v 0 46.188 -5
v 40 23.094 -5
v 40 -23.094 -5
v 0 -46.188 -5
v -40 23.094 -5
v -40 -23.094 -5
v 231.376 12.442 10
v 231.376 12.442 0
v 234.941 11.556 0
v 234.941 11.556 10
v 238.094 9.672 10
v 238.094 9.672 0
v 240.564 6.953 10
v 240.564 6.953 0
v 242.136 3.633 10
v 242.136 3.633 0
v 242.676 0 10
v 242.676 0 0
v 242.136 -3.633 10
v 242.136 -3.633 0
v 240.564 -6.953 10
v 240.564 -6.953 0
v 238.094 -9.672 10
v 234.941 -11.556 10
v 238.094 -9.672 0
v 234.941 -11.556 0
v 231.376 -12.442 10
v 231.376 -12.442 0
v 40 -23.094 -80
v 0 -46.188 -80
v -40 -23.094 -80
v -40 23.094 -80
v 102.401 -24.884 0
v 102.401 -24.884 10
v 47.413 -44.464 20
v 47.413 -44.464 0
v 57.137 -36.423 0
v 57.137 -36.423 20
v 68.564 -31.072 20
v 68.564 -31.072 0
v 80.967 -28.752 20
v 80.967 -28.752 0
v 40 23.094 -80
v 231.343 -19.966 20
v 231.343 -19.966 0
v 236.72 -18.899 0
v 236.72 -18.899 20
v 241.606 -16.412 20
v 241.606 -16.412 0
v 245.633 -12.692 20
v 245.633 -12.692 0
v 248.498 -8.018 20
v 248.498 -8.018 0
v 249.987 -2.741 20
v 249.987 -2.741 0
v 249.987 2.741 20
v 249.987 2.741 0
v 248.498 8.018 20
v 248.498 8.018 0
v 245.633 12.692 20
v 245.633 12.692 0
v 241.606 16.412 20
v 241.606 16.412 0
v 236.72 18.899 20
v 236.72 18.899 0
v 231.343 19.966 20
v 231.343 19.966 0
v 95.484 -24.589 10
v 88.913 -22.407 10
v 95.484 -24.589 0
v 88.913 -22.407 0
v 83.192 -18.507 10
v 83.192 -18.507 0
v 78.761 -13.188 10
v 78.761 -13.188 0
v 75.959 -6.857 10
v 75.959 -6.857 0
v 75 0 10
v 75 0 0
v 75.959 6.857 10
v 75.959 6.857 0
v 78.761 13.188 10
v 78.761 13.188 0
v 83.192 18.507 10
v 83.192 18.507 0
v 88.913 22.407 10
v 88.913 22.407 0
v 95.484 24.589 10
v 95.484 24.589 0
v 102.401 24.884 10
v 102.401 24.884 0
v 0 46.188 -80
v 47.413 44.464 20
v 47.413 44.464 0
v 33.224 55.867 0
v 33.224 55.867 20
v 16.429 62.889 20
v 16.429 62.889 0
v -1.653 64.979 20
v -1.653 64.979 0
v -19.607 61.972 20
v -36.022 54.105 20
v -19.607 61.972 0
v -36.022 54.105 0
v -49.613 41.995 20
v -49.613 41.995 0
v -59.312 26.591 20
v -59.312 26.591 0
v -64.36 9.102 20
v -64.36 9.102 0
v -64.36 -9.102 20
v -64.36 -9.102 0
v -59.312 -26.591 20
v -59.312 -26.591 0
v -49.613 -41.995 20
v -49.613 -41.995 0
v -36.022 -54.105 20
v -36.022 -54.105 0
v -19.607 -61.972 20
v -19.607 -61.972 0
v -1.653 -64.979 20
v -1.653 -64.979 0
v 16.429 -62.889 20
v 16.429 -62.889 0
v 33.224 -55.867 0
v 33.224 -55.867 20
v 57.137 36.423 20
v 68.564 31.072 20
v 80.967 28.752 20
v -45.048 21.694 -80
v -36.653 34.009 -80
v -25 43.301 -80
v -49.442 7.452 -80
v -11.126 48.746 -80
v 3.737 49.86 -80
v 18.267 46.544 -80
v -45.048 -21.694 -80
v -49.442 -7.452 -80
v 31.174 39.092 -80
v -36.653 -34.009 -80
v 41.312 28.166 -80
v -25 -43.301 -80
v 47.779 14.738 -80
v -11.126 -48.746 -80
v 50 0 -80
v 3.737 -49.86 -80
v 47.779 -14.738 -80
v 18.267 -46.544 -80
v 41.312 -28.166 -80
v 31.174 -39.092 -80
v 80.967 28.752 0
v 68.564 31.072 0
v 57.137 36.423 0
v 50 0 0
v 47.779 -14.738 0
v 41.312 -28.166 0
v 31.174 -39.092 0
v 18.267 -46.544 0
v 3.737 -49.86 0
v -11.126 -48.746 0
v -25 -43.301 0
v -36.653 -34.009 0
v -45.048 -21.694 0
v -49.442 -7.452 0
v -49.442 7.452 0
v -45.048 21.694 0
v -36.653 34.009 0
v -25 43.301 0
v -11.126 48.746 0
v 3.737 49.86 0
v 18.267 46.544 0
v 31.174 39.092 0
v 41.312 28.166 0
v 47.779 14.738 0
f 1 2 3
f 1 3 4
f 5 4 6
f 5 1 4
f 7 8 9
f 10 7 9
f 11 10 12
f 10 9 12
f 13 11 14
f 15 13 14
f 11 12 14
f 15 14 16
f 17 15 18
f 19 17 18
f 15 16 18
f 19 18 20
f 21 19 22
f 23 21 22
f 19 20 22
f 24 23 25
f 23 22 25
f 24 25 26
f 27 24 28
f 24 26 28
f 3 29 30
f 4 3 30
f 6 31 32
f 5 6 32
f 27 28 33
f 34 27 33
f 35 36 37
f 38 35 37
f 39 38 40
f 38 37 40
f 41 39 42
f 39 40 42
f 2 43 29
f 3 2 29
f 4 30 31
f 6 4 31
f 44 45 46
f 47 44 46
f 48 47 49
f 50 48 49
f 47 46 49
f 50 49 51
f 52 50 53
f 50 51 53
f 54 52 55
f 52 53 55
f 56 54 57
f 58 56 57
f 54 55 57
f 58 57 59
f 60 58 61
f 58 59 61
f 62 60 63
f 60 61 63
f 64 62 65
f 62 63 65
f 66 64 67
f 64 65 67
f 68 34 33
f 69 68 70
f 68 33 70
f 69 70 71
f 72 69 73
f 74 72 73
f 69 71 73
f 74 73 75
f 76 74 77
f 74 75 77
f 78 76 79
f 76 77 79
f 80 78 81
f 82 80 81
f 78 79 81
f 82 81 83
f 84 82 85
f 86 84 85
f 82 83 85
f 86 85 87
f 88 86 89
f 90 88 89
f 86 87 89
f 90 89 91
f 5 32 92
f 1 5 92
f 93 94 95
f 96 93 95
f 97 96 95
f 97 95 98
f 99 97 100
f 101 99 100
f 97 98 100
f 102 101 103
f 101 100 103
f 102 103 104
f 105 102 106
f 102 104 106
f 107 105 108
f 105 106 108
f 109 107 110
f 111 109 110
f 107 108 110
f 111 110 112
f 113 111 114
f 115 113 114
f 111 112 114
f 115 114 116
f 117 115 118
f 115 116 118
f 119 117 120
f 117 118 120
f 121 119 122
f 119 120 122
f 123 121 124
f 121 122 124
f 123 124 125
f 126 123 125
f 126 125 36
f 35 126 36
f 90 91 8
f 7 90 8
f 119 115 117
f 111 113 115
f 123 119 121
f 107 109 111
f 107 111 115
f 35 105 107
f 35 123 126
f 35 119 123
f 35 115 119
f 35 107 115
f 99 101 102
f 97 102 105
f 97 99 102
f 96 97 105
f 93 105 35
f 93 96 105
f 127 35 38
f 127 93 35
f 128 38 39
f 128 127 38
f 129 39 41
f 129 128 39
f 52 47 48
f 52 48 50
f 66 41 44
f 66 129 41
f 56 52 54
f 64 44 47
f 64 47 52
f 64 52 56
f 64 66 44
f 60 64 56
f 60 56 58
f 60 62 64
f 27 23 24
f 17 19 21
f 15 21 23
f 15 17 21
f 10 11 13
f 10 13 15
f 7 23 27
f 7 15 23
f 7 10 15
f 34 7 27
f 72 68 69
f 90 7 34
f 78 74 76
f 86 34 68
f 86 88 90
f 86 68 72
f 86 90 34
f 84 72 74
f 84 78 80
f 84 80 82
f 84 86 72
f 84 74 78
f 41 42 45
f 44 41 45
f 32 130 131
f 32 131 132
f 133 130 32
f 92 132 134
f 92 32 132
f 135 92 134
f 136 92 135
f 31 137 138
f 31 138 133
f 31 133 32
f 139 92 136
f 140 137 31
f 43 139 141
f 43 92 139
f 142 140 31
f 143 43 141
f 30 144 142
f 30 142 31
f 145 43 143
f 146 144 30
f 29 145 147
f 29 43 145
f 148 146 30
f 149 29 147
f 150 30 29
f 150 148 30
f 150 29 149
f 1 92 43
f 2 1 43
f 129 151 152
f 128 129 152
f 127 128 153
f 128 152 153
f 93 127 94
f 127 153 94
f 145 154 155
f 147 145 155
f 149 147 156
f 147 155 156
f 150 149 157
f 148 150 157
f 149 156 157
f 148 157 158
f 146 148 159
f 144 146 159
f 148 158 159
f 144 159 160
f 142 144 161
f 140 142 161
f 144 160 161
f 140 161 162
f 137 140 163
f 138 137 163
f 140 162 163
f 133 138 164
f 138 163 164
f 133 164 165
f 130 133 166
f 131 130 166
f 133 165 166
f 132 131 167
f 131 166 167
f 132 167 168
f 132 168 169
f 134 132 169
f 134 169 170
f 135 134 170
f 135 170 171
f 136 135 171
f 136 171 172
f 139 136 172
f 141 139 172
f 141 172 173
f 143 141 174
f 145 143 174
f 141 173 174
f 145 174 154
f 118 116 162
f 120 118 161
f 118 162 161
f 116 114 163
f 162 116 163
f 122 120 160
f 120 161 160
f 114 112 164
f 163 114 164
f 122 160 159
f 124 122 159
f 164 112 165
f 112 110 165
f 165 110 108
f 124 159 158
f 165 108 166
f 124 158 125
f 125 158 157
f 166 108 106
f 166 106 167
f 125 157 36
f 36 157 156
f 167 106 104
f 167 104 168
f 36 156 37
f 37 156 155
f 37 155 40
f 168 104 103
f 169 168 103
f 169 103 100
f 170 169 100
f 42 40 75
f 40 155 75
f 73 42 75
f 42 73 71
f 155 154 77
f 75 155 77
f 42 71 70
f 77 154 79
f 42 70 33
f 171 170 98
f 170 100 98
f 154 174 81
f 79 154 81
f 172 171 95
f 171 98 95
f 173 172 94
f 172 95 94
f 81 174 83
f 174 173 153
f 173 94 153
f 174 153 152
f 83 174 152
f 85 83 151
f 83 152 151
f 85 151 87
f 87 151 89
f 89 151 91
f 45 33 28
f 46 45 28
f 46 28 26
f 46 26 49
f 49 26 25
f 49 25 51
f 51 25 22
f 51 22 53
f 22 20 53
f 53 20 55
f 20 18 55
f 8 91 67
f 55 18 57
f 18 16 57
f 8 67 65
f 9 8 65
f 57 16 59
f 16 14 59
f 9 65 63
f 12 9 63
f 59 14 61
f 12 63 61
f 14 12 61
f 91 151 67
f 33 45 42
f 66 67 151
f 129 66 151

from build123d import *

# Parameters (mm, degrees)
BOSS_EXTRUDE1_DEPTH = 20
CUT_EXTRUDE1_DEPTH  = 10
SKETCH9_R           = 50
BOSS_EXTRUDE4_DEPTH = 80
CUT_EXTRUDE4_DEPTH  = 75


with BuildPart() as part:
    # Sketch3 → Boss-Extrude1 (new body)
    with BuildSketch(Plane.XY):
        with BuildLine():
            Line((231.34250824, 19.965947877), (80.967339763, 28.752193652))
            ThreePointArc((80.967339763, 28.752193652), (62.680914893, 33.385308199), (47.412586794, 44.463992326))
            ThreePointArc((47.412586794, 44.463992326), (-65, 0), (47.412586794, -44.463992326))
            ThreePointArc((47.412586794, -44.463992326), (62.680914893, -33.385308199), (80.967339763, -28.752193652))
            Line((80.967339763, -28.752193652), (231.34250824, -19.965947877))
            ThreePointArc((231.34250824, -19.965947877), (250.175921184, 0), (231.34250824, 19.965947877))
        make_face()
    extrude(amount=BOSS_EXTRUDE1_DEPTH)

    # Sketch4 → Cut-Extrude1 (cut)
    with BuildSketch(Plane(origin=(0, 0, 0), x_dir=(-1, 0, 0), z_dir=(0, 0, -1))):
        with BuildLine():
            Line((-231.376219968, -12.442237854), (-102.400597569, -24.884475709))
            ThreePointArc((-102.400597569, -24.884475709), (-75, 0), (-102.400597569, 24.884475709))
            Line((-102.400597569, 24.884475709), (-231.376219968, 12.442237854))
            ThreePointArc((-231.376219968, 12.442237854), (-242.675921184, 0), (-231.376219968, -12.442237854))
        make_face()
    extrude(amount=-CUT_EXTRUDE1_DEPTH, mode=Mode.SUBTRACT)

    # Sketch9 → Boss-Extrude4 (add)
    with BuildSketch(Plane(origin=(0, 0, 0), x_dir=(-1, 0, 0), z_dir=(0, 0, -1))):
        with Locations(Location((0, 0, 0), (0, 0, 180))):
            Circle(SKETCH9_R)
    extrude(amount=BOSS_EXTRUDE4_DEPTH)

    # Sketch10 → Cut-Extrude4 (cut)
    with BuildSketch(Plane(origin=(0, 0, -80), x_dir=(-1, 0, 0), z_dir=(0, 0, -1))):
        Polygon((0, 46.188021535), (-40, 23.094010768), (-40, -23.094010768), (0, -46.188021535), (40, -23.094010768), (40, 23.094010768), align=None)
    extrude(amount=-CUT_EXTRUDE4_DEPTH, mode=Mode.SUBTRACT)


solid = part.part
